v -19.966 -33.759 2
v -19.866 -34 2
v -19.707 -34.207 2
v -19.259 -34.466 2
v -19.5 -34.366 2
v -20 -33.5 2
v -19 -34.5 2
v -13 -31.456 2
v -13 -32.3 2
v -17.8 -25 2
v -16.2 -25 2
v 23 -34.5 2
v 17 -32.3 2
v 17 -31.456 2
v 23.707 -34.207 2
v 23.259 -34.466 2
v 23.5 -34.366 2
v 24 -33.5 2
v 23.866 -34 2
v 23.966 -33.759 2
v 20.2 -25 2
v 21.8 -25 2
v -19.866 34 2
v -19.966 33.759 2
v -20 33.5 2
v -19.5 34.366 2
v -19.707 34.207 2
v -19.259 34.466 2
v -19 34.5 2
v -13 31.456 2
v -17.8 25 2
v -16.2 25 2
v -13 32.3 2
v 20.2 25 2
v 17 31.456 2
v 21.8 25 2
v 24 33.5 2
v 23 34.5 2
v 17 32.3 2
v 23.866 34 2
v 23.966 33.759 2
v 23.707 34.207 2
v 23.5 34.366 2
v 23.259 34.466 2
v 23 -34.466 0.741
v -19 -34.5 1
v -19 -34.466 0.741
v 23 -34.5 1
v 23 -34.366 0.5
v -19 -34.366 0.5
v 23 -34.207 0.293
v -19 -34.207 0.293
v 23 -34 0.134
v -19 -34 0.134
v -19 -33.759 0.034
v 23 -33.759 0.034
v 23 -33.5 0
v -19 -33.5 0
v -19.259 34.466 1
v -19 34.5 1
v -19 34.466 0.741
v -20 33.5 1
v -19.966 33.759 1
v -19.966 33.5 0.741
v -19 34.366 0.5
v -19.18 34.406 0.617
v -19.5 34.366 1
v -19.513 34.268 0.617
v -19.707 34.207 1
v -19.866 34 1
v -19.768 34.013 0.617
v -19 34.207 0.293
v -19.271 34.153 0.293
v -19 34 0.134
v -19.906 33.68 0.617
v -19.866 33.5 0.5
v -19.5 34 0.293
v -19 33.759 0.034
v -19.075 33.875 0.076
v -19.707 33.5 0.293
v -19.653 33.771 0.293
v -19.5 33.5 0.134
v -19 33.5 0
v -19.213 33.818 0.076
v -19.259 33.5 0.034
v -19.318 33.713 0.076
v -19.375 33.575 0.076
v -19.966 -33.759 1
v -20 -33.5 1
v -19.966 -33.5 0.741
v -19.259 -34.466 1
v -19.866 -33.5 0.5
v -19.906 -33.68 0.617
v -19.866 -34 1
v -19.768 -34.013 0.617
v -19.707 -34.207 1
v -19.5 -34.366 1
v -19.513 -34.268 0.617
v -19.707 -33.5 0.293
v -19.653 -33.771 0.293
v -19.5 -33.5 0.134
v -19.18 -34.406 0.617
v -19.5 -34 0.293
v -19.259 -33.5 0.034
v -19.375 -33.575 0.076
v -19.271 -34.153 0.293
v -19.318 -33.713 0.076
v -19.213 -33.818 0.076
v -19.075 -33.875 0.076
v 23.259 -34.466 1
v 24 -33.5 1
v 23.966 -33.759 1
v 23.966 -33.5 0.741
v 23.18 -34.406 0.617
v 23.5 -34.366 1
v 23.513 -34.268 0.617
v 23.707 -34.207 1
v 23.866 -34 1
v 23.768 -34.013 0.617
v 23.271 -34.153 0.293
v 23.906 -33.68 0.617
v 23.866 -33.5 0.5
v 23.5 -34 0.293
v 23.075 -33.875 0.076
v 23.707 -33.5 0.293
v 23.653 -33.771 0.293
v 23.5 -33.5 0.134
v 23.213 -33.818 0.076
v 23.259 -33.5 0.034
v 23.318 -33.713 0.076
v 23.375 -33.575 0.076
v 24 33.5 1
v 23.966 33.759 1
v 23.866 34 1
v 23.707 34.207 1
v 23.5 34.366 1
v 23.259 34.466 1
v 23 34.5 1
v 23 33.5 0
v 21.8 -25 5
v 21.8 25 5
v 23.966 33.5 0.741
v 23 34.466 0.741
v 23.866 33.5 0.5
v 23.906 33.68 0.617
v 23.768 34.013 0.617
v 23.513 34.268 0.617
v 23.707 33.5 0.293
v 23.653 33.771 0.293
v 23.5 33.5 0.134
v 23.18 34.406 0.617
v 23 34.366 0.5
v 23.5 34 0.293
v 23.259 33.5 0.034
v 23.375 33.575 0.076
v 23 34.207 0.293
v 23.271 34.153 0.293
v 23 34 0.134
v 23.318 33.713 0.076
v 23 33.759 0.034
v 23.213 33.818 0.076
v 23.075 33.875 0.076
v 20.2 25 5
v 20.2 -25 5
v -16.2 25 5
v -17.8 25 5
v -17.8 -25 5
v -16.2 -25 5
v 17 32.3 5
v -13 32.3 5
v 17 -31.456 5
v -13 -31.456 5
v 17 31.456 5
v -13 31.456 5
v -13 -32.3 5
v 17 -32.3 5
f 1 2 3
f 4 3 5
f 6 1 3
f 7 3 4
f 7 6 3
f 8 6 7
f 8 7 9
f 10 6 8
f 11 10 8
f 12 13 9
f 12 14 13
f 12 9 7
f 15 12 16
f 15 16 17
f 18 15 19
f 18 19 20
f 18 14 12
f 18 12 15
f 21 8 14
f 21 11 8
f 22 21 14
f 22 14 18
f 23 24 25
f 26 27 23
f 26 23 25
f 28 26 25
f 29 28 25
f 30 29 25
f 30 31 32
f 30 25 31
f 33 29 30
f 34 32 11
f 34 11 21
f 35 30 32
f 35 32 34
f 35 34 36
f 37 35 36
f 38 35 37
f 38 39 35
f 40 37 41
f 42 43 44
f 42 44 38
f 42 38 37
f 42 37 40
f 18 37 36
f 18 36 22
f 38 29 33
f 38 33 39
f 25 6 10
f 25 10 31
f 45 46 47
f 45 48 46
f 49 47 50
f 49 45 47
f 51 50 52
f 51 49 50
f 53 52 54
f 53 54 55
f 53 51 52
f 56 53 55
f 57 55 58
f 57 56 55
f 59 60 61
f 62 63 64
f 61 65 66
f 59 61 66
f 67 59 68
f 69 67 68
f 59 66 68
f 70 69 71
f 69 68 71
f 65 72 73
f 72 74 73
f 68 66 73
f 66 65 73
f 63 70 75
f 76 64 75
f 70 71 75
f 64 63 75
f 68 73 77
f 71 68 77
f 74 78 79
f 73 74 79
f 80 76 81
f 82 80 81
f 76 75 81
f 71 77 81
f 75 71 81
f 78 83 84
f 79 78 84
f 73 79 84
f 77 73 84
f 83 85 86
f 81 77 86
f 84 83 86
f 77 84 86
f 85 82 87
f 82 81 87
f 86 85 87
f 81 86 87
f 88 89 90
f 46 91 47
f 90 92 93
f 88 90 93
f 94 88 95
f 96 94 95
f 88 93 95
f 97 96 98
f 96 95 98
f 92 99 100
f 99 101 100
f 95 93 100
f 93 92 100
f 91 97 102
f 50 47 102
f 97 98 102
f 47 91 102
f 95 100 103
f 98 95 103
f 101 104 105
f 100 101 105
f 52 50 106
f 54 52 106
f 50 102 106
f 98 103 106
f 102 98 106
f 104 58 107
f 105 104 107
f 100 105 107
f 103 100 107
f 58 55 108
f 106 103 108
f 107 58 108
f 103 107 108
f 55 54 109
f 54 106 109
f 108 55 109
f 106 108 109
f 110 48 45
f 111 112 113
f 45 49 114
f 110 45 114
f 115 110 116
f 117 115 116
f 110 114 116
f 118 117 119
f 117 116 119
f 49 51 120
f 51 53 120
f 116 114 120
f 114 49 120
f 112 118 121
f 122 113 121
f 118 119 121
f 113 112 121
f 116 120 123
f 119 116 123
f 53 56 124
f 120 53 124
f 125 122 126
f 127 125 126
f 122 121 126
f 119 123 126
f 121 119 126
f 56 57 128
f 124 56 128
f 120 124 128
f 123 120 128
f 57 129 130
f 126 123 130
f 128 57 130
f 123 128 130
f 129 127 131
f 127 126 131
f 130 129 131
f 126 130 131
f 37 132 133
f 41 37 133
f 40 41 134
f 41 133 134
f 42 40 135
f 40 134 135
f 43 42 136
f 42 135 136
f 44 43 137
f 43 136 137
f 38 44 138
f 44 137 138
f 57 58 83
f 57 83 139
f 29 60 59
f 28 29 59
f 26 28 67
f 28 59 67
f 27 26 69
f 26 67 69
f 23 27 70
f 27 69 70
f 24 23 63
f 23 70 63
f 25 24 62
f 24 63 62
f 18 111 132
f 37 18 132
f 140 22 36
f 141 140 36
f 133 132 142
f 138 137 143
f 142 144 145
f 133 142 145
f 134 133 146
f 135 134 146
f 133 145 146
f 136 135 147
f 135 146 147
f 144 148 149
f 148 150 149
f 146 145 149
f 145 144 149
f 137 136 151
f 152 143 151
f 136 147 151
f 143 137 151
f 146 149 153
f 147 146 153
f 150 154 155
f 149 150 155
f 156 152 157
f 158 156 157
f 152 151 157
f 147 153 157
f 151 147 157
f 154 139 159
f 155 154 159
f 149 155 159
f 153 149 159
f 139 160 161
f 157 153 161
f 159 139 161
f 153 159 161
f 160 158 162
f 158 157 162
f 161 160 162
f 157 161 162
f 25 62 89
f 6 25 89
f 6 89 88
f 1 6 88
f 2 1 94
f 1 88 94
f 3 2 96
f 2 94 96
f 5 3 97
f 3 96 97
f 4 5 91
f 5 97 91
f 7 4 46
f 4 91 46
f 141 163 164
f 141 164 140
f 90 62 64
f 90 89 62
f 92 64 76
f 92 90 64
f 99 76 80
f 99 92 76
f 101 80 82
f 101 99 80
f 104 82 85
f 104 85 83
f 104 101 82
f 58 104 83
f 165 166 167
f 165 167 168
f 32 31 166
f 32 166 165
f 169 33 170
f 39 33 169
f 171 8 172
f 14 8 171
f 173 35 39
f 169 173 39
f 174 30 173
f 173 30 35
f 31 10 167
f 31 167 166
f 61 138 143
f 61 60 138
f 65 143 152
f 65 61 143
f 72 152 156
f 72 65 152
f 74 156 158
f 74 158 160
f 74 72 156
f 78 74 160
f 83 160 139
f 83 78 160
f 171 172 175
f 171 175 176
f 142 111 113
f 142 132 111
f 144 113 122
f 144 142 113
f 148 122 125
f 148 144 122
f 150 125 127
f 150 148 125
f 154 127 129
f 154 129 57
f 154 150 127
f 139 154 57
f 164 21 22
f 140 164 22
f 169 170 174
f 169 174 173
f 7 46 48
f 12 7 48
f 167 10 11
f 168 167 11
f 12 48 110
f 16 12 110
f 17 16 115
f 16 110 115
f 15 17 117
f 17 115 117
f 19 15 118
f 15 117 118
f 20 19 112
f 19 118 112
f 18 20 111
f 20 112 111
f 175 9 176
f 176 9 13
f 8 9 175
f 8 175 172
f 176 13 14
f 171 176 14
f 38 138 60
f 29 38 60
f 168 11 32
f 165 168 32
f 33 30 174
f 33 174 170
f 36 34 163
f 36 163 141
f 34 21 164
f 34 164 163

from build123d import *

# Parameters (mm, degrees)
F0_W     = 30
F0_H     = 0.843597576
F0_W_2   = 1.6
F0_H_2   = 50
F1_DEPTH = 2
F2_DEPTH = 5
F3_R     = 1


with BuildPart() as f1:
    # F0 (on Top) → F1 (new body)
    with BuildSketch(Plane.XY):
        with BuildLine():
            Line((-19, -34.5), (23, -34.5))
            ThreePointArc((23, -34.5), (23.7071067812, -34.2071067812), (24, -33.5))
            Line((24, -33.5), (24, 33.5))
            ThreePointArc((24, 33.5), (23.7071067812, 34.2071067812), (23, 34.5))
            Line((23, 34.5), (-19, 34.5))
            ThreePointArc((-19, 34.5), (-19.7071067812, 34.2071067812), (-20, 33.5))
            Line((-20, 33.5), (-20, -33.5))
            ThreePointArc((-20, -33.5), (-19.7071067812, -34.2071067812), (-19, -34.5))
        make_face()
        with Locations((2, -31.878201212)):
            Rectangle(F0_W, F0_H, mode=Mode.SUBTRACT)
        with Locations((-17, 0)):
            Rectangle(F0_W_2, F0_H_2, mode=Mode.SUBTRACT)
        with Locations((21, 0)):
            Rectangle(F0_W_2, F0_H_2, mode=Mode.SUBTRACT)
        with Locations((2, 31.878201212)):
            Rectangle(F0_W, F0_H, mode=Mode.SUBTRACT)
    extrude(amount=F1_DEPTH)

    # F0 (on Top) → F2 (join)
    with BuildSketch(Plane.XY):
        with Locations((-17, 0)):
            Rectangle(F0_W_2, F0_H_2)
        with Locations((2, 31.878201212)):
            Rectangle(F0_W, F0_H)
        with Locations((21, 0)):
            Rectangle(F0_W_2, F0_H_2)
        with Locations((2, -31.878201212)):
            Rectangle(F0_W, F0_H)
    extrude(amount=F2_DEPTH)

    # F3
    f3_edges = [f1.edges().sort_by_distance(p)[0] for p in [
        (-20, 0, 0),
        (-19.707107, -34.207107, 0),
        (2, -34.5, 0),
        (23.707107, -34.207107, 0),
        (24, 0, 0),
        (23.707107, 34.207107, 0),
        (2, 34.5, 0),
        (-19.707107, 34.207107, 0),
    ]]
    fillet(f3_edges, radius=F3_R)


solid = f1.part
